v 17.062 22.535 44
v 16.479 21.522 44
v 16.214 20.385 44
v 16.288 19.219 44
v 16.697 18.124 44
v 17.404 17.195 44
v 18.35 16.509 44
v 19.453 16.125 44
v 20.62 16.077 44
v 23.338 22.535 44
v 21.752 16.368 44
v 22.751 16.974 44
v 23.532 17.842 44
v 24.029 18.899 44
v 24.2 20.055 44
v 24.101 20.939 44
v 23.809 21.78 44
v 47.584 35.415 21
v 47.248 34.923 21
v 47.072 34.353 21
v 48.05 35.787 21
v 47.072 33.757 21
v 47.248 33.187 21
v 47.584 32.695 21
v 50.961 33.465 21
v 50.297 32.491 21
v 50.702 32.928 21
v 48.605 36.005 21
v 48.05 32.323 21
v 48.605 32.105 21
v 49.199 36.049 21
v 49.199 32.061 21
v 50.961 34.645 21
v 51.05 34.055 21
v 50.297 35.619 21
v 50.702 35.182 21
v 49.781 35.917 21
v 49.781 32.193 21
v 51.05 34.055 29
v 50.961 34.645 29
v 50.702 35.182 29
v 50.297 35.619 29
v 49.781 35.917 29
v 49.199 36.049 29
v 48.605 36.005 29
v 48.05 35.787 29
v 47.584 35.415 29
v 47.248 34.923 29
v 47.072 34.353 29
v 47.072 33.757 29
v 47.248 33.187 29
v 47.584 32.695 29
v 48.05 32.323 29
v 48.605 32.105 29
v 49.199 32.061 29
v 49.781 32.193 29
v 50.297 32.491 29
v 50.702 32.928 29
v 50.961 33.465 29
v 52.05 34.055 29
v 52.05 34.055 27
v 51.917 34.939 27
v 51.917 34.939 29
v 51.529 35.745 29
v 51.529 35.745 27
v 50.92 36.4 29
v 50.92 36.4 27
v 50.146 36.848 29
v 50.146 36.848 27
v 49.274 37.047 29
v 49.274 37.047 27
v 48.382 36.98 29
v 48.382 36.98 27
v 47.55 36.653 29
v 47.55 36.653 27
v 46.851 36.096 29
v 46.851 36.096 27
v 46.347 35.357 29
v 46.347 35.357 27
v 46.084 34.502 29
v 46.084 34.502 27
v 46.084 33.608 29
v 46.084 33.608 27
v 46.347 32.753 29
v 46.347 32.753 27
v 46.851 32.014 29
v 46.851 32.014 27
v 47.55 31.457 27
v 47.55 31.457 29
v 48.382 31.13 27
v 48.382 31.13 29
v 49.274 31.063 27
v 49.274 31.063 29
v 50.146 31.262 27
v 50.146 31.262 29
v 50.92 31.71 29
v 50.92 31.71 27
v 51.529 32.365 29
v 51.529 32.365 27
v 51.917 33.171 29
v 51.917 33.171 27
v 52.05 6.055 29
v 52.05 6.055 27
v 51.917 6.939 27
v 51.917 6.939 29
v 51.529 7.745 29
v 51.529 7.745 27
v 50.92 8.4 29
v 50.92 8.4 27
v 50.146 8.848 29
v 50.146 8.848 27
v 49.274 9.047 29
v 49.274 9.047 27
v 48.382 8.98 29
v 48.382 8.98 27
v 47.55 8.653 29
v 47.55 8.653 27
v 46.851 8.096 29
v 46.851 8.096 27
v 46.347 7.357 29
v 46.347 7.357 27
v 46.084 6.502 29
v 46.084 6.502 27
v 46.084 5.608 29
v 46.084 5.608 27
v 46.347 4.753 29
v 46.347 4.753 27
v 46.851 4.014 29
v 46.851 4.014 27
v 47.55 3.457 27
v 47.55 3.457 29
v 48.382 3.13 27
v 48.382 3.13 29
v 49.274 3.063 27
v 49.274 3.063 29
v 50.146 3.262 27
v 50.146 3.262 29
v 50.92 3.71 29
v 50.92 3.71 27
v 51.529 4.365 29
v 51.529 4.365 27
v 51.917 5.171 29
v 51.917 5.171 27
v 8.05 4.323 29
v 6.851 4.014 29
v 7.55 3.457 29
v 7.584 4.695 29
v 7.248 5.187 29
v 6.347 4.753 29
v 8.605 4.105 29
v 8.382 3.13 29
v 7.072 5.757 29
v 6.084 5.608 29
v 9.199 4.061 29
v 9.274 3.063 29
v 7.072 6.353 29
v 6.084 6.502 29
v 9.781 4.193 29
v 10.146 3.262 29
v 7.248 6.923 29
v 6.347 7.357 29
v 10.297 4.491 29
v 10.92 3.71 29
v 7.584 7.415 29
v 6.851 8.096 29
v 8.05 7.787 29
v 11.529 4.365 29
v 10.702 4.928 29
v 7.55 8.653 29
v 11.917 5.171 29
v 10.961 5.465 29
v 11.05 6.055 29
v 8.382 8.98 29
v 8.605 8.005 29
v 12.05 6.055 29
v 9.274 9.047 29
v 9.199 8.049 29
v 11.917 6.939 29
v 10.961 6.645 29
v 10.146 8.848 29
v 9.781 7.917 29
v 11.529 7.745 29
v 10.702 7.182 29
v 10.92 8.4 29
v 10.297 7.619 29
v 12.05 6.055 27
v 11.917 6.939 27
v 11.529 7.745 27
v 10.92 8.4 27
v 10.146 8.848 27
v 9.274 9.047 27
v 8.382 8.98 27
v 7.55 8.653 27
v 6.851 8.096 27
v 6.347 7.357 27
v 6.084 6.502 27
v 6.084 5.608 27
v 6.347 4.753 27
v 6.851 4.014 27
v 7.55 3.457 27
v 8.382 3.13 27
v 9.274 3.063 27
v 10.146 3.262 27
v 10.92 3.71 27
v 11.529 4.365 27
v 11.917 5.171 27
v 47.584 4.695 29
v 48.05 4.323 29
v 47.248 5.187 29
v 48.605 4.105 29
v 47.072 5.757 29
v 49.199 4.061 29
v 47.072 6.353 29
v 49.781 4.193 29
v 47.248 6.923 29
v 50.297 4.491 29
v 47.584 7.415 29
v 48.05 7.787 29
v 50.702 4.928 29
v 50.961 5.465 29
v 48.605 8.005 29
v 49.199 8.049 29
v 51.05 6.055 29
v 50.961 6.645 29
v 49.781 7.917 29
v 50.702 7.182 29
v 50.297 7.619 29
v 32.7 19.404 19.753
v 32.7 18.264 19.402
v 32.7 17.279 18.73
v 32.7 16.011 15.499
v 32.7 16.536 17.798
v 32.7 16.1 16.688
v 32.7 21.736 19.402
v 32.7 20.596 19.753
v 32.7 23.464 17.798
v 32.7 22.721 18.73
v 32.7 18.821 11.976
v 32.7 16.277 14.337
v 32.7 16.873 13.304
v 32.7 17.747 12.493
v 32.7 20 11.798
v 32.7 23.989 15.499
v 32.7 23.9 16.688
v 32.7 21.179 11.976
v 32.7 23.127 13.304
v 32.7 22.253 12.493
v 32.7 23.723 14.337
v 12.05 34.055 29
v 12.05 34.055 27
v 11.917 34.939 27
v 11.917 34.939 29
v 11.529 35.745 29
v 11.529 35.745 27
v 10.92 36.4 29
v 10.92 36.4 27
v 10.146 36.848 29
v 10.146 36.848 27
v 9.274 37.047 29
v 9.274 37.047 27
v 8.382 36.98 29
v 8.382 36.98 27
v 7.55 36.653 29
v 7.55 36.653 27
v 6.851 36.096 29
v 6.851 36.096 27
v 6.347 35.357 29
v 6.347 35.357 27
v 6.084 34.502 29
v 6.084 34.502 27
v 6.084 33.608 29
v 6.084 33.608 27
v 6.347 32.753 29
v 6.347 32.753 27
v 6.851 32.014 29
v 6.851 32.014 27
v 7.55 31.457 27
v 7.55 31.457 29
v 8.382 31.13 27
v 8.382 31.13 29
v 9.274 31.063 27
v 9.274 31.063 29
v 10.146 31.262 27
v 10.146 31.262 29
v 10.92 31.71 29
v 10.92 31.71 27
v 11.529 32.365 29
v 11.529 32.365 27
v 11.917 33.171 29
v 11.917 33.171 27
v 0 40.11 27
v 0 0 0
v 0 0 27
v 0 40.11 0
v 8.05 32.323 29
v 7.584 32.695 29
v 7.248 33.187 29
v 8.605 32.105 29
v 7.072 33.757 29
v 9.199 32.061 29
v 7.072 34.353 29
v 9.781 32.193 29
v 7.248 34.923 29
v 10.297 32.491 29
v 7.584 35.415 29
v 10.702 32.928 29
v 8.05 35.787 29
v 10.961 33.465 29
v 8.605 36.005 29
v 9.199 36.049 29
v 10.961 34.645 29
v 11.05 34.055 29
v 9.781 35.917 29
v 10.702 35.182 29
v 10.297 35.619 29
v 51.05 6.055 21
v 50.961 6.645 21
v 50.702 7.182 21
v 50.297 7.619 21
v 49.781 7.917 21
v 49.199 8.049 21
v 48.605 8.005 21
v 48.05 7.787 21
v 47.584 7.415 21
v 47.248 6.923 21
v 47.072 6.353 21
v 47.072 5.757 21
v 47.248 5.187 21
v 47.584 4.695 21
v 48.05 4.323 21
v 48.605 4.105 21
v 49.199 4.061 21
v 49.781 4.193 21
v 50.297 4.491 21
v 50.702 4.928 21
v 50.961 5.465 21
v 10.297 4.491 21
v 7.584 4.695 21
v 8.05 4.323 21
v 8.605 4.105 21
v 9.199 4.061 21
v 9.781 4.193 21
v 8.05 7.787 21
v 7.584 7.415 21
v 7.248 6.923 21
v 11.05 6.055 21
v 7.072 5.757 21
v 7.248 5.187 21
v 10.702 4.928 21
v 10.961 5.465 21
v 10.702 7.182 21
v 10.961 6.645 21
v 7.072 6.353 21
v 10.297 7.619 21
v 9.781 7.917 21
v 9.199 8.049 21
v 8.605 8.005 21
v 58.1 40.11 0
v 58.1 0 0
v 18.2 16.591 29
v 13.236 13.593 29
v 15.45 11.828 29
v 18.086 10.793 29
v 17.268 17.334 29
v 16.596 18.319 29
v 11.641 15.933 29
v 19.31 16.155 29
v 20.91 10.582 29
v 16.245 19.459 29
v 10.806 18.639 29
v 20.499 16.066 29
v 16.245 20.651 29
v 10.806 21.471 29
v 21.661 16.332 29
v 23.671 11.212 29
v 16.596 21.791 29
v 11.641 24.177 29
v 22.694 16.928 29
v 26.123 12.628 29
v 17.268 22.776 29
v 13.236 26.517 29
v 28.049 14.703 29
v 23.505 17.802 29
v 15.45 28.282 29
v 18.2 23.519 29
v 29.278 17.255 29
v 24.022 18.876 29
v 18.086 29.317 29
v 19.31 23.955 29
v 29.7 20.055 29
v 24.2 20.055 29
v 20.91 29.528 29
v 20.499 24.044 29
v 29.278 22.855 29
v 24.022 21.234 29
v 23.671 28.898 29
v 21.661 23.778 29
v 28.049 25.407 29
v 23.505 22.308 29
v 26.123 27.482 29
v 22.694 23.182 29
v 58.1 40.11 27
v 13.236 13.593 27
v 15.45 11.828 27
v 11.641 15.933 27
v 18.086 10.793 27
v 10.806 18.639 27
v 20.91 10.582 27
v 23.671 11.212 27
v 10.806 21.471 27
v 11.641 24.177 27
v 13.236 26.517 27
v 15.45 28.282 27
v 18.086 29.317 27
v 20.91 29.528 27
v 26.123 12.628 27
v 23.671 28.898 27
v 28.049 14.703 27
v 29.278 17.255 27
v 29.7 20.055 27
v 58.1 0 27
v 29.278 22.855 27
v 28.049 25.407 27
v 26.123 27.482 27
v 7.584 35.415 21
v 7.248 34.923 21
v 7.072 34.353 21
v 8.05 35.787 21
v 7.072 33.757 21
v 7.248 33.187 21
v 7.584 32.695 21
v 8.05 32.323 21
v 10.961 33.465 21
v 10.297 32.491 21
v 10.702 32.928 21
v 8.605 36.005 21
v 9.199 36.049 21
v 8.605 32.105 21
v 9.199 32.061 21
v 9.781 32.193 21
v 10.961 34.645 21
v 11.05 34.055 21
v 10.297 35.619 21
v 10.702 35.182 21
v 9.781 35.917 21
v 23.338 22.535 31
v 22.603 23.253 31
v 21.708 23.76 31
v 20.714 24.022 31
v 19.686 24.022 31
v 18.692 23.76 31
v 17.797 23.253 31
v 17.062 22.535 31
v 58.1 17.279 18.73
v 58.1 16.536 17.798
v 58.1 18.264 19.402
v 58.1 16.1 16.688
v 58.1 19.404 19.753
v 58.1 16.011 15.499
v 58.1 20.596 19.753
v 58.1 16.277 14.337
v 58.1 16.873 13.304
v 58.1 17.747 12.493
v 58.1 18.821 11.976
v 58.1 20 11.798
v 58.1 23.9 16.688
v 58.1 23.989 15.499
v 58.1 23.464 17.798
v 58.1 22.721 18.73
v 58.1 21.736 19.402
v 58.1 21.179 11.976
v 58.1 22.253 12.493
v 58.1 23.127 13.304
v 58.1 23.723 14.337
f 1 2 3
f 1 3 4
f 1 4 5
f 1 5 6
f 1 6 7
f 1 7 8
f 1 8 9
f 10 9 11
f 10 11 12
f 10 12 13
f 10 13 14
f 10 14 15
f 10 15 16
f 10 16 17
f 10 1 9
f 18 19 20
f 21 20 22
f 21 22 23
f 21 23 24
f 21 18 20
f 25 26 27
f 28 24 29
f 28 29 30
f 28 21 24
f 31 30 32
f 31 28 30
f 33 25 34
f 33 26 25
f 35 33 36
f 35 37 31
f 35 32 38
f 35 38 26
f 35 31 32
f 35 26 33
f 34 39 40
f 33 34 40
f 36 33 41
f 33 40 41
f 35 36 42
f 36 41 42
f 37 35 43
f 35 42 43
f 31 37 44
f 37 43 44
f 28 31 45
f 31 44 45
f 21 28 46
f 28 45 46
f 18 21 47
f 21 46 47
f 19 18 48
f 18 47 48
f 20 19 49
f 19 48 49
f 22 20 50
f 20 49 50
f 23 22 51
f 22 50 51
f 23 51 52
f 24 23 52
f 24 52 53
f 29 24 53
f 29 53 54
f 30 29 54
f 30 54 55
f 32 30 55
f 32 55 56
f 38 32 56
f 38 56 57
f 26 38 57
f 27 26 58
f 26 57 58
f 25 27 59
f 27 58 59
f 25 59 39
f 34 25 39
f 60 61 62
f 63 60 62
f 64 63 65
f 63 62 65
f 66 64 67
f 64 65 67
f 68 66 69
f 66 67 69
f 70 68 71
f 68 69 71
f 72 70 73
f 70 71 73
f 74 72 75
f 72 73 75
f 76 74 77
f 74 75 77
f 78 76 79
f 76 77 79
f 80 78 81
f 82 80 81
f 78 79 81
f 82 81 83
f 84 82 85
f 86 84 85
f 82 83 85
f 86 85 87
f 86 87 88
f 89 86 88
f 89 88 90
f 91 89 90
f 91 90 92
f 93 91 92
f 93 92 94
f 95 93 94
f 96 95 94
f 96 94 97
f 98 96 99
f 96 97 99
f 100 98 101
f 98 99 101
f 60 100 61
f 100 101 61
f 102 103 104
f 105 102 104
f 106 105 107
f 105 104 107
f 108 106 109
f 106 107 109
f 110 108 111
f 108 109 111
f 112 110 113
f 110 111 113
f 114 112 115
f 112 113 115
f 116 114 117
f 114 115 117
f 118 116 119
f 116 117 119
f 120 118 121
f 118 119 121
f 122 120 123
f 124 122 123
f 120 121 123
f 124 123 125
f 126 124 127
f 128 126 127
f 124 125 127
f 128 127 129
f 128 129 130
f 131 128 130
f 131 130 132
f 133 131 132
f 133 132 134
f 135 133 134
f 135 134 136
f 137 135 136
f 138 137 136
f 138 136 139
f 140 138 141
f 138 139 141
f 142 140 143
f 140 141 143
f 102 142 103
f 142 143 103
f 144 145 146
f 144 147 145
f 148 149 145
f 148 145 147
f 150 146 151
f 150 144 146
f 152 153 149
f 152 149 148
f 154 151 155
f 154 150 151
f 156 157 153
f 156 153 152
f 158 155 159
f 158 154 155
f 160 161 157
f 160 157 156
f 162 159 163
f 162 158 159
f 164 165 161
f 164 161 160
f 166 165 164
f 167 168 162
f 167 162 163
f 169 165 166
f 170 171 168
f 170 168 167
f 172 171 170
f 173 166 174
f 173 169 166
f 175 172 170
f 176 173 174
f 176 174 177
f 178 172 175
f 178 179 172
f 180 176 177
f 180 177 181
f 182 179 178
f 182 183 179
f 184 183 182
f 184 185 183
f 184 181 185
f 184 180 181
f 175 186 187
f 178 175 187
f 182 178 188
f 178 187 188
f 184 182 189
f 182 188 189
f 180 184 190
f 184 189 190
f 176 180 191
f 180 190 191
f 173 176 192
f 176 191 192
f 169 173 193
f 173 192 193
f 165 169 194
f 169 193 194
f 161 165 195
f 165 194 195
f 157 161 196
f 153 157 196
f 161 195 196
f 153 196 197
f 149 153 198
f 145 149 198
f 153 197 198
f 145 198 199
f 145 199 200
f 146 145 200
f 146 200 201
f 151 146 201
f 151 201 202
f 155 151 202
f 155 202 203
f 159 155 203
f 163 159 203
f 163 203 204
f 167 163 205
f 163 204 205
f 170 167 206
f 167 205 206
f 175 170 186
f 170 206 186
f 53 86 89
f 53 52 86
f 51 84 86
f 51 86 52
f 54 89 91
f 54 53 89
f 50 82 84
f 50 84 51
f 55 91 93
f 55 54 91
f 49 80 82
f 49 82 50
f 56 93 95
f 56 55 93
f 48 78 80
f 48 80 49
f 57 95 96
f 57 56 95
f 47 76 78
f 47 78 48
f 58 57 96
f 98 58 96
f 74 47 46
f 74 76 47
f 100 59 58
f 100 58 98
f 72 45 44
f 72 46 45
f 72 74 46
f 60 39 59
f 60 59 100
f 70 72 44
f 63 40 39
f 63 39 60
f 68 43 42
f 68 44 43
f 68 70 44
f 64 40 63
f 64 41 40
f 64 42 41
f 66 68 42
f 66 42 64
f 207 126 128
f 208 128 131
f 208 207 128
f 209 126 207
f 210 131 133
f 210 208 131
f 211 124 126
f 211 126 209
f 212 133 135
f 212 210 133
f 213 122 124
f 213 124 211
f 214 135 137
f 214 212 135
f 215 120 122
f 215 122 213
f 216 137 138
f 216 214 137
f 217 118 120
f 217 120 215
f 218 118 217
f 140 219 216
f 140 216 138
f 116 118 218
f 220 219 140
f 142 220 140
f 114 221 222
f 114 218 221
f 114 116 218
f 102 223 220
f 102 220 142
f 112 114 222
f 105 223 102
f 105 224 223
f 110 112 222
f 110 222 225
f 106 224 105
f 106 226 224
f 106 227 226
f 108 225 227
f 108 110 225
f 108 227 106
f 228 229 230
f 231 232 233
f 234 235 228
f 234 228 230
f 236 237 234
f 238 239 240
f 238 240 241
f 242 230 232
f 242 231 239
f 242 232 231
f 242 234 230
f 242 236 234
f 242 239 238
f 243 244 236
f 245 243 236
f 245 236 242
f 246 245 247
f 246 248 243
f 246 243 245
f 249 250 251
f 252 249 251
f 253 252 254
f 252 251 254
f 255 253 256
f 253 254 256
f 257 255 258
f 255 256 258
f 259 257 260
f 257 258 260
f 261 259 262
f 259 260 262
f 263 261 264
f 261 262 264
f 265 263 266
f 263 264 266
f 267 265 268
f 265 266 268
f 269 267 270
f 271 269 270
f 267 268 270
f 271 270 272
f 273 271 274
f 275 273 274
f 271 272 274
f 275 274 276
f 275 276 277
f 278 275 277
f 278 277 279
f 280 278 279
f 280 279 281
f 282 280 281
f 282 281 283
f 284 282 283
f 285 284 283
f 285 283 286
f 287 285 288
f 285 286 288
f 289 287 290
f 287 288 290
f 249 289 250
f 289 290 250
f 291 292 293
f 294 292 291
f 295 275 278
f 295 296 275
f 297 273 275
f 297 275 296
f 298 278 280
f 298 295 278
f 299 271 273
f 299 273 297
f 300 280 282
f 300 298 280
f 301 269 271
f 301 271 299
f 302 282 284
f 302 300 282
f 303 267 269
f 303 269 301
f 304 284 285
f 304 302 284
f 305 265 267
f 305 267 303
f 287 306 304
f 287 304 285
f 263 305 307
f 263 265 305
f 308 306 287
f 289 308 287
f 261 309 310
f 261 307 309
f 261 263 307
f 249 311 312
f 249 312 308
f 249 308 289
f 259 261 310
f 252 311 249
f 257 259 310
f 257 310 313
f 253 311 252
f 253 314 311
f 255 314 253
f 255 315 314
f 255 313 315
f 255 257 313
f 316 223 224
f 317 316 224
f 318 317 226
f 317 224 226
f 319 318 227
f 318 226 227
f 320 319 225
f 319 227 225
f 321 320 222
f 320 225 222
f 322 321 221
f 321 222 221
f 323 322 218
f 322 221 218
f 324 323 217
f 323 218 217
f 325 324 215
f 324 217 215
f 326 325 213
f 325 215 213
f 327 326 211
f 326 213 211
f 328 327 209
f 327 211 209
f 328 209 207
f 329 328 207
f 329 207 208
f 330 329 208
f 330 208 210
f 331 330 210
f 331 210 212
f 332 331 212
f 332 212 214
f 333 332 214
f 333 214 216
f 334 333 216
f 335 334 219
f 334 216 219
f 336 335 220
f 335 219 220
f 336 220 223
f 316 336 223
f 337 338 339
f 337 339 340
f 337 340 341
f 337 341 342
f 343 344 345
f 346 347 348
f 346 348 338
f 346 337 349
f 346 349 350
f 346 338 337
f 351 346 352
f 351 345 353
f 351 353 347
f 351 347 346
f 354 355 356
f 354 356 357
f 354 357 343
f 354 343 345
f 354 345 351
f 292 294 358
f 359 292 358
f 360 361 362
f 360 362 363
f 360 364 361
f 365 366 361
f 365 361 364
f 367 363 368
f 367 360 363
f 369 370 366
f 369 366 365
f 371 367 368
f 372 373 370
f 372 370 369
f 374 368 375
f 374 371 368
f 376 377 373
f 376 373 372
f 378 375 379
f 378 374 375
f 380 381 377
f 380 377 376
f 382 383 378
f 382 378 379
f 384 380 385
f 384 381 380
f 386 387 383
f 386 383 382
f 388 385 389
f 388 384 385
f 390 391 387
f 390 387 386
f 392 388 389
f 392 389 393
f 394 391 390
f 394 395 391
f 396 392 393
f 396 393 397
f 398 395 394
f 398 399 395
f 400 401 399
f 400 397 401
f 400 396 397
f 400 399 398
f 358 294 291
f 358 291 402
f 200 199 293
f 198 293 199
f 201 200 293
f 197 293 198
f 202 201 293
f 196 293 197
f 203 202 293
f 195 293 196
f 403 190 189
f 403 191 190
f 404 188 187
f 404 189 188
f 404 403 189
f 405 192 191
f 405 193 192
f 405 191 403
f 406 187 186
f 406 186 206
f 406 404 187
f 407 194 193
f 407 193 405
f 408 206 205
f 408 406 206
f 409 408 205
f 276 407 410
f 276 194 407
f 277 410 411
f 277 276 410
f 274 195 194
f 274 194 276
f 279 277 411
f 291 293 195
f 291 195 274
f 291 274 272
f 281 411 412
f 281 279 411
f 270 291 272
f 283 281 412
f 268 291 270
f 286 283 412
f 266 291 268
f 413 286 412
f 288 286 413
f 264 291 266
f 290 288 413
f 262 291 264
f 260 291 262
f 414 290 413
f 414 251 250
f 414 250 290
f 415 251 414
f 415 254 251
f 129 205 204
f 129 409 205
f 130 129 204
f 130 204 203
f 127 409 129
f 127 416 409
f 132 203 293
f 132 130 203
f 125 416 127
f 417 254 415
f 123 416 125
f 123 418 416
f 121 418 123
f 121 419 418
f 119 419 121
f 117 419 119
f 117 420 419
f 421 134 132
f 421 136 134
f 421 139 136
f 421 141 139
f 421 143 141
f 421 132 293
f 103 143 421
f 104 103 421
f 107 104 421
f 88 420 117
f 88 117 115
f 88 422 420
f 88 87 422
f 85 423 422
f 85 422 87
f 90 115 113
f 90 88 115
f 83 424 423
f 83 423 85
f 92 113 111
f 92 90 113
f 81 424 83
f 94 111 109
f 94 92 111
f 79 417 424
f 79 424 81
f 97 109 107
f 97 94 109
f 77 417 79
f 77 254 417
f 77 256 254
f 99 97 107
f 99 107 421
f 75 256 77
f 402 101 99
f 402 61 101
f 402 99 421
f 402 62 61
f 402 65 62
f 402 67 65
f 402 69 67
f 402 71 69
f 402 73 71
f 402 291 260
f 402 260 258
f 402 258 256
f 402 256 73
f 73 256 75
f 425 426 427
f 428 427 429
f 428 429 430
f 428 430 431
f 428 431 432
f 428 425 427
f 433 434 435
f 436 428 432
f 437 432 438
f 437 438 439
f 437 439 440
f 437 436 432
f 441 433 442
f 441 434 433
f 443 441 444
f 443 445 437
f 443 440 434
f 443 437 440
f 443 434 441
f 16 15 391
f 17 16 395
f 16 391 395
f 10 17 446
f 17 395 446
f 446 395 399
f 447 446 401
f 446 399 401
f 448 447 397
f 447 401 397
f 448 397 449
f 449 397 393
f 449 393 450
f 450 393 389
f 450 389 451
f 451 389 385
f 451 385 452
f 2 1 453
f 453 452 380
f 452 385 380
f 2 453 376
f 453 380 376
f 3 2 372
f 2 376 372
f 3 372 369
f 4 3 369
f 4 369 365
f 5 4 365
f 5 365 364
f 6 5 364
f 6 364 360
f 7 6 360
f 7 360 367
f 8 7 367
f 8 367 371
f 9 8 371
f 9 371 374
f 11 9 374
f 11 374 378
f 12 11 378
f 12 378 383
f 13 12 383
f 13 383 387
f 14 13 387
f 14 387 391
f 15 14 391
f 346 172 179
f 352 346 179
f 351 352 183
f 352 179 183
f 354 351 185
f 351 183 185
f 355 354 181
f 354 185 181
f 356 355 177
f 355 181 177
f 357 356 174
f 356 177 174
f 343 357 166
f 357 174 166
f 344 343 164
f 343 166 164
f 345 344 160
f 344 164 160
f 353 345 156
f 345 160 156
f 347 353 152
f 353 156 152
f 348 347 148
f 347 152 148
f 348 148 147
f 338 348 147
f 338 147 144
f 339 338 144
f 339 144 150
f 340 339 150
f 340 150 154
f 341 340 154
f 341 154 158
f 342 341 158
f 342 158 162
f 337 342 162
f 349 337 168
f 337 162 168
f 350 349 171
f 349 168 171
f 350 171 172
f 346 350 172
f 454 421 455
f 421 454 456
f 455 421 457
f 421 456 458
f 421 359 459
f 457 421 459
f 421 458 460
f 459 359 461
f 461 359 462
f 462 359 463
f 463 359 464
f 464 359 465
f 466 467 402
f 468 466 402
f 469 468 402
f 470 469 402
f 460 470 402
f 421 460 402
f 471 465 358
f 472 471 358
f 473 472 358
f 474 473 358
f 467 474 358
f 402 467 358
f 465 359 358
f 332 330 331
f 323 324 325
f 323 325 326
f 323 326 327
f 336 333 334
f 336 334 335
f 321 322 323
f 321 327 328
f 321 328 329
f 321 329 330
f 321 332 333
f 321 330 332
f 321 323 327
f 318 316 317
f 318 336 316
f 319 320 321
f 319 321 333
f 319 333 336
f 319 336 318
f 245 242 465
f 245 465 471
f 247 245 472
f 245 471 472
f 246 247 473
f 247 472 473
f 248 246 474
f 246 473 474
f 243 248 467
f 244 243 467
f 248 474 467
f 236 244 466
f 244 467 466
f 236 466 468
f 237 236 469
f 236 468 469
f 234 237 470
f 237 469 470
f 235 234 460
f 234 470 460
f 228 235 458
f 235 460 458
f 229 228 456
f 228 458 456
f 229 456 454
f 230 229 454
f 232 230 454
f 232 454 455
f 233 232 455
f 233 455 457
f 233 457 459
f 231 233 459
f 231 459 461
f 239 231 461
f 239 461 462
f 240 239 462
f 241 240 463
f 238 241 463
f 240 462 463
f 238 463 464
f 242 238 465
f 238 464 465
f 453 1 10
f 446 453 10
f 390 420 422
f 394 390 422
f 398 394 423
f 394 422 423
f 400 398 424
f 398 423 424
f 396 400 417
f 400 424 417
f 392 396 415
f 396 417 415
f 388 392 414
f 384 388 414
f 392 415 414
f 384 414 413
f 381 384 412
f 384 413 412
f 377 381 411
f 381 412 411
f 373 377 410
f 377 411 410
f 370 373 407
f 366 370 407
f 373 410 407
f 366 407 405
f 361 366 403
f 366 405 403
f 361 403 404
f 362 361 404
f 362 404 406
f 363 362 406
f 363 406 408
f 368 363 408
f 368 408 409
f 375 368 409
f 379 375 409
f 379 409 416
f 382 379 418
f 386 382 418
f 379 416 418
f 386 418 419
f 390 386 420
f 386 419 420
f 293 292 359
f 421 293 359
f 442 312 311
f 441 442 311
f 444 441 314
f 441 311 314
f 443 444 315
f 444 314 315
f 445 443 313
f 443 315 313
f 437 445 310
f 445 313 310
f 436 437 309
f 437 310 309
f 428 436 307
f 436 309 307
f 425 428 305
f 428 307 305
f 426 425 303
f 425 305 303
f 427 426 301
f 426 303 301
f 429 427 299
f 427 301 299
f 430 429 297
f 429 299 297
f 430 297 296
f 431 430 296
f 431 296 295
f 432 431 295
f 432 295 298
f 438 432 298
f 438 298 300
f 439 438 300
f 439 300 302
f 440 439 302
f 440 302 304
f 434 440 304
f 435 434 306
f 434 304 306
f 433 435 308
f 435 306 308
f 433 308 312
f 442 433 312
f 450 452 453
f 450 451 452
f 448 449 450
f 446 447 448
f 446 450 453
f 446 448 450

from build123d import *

# Parameters (mm, degrees)
SKETCH1_W           = 58.1
SKETCH1_H           = 40.11
BOSS_EXTRUDE1_DEPTH = 27
SKETCH2_R           = 9.5
BOSS_EXTRUDE2_DEPTH = 2
SKETCH3_R           = 4
BOSS_EXTRUDE3_DEPTH = 15
SKETCH4_W           = 6.276876118
SKETCH4_H           = 1.998885949
CUT_EXTRUDE1_DEPTH  = 13
SKETCH5_R           = 3
BOSS_EXTRUDE4_DEPTH = 2
SKETCH6_R           = 2
CUT_EXTRUDE2_DEPTH  = 8
SKETCH7_R           = 4
CUT_EXTRUDE3_DEPTH  = 25.4


with BuildPart() as part:
    # Sketch1 → Boss-Extrude1 (new body)
    with BuildSketch(Plane.XY):
        with Locations((29.05, 20.055)):
            Rectangle(SKETCH1_W, SKETCH1_H)
    extrude(amount=BOSS_EXTRUDE1_DEPTH)

    # Sketch2 → Boss-Extrude2 (add)
    with BuildSketch(Plane.XY.offset(27)):
        with Locations((20.2, 20.055)):
            Circle(SKETCH2_R)
    extrude(amount=BOSS_EXTRUDE2_DEPTH)

    # Sketch3 → Boss-Extrude3 (add)
    with BuildSketch(Plane.XY.offset(29)):
        with Locations((20.2, 20.055)):
            Circle(SKETCH3_R)
    extrude(amount=BOSS_EXTRUDE3_DEPTH)

    # Sketch4 → Cut-Extrude1 (cut)
    with BuildSketch(Plane.XY.offset(44)):
        with Locations((20.2, 23.534403972)):
            Rectangle(SKETCH4_W, SKETCH4_H)
    extrude(amount=-CUT_EXTRUDE1_DEPTH, mode=Mode.SUBTRACT)

    # Sketch5 → Boss-Extrude4 (add)
    with BuildSketch(Plane.XY.offset(27)):
        with Locations((9.05, 34.055)):
            Circle(SKETCH5_R)
        with Locations((49.05, 34.055)):
            Circle(SKETCH5_R)
        with Locations((49.05, 6.055)):
            Circle(SKETCH5_R)
        with Locations((9.05, 6.055)):
            Circle(SKETCH5_R)
    extrude(amount=BOSS_EXTRUDE4_DEPTH)

    # Sketch6 → Cut-Extrude2 (cut)
    with BuildSketch(Plane.XY.offset(29)):
        with Locations((9.05, 34.055)):
            Circle(SKETCH6_R)
        with Locations((49.05, 34.055)):
            Circle(SKETCH6_R)
        with Locations((49.05, 6.055)):
            Circle(SKETCH6_R)
        with Locations((9.05, 6.055)):
            Circle(SKETCH6_R)
    extrude(amount=-CUT_EXTRUDE2_DEPTH, mode=Mode.SUBTRACT)

    # Sketch7 → Cut-Extrude3 (cut)
    with BuildSketch(Plane(origin=(58.1, 0, 0), x_dir=(0, 0, -1), z_dir=(1, 0, 0))):
        with Locations((-15.797911108, 20)):
            Circle(SKETCH7_R)
    extrude(amount=-CUT_EXTRUDE3_DEPTH, mode=Mode.SUBTRACT)


solid = part.part
